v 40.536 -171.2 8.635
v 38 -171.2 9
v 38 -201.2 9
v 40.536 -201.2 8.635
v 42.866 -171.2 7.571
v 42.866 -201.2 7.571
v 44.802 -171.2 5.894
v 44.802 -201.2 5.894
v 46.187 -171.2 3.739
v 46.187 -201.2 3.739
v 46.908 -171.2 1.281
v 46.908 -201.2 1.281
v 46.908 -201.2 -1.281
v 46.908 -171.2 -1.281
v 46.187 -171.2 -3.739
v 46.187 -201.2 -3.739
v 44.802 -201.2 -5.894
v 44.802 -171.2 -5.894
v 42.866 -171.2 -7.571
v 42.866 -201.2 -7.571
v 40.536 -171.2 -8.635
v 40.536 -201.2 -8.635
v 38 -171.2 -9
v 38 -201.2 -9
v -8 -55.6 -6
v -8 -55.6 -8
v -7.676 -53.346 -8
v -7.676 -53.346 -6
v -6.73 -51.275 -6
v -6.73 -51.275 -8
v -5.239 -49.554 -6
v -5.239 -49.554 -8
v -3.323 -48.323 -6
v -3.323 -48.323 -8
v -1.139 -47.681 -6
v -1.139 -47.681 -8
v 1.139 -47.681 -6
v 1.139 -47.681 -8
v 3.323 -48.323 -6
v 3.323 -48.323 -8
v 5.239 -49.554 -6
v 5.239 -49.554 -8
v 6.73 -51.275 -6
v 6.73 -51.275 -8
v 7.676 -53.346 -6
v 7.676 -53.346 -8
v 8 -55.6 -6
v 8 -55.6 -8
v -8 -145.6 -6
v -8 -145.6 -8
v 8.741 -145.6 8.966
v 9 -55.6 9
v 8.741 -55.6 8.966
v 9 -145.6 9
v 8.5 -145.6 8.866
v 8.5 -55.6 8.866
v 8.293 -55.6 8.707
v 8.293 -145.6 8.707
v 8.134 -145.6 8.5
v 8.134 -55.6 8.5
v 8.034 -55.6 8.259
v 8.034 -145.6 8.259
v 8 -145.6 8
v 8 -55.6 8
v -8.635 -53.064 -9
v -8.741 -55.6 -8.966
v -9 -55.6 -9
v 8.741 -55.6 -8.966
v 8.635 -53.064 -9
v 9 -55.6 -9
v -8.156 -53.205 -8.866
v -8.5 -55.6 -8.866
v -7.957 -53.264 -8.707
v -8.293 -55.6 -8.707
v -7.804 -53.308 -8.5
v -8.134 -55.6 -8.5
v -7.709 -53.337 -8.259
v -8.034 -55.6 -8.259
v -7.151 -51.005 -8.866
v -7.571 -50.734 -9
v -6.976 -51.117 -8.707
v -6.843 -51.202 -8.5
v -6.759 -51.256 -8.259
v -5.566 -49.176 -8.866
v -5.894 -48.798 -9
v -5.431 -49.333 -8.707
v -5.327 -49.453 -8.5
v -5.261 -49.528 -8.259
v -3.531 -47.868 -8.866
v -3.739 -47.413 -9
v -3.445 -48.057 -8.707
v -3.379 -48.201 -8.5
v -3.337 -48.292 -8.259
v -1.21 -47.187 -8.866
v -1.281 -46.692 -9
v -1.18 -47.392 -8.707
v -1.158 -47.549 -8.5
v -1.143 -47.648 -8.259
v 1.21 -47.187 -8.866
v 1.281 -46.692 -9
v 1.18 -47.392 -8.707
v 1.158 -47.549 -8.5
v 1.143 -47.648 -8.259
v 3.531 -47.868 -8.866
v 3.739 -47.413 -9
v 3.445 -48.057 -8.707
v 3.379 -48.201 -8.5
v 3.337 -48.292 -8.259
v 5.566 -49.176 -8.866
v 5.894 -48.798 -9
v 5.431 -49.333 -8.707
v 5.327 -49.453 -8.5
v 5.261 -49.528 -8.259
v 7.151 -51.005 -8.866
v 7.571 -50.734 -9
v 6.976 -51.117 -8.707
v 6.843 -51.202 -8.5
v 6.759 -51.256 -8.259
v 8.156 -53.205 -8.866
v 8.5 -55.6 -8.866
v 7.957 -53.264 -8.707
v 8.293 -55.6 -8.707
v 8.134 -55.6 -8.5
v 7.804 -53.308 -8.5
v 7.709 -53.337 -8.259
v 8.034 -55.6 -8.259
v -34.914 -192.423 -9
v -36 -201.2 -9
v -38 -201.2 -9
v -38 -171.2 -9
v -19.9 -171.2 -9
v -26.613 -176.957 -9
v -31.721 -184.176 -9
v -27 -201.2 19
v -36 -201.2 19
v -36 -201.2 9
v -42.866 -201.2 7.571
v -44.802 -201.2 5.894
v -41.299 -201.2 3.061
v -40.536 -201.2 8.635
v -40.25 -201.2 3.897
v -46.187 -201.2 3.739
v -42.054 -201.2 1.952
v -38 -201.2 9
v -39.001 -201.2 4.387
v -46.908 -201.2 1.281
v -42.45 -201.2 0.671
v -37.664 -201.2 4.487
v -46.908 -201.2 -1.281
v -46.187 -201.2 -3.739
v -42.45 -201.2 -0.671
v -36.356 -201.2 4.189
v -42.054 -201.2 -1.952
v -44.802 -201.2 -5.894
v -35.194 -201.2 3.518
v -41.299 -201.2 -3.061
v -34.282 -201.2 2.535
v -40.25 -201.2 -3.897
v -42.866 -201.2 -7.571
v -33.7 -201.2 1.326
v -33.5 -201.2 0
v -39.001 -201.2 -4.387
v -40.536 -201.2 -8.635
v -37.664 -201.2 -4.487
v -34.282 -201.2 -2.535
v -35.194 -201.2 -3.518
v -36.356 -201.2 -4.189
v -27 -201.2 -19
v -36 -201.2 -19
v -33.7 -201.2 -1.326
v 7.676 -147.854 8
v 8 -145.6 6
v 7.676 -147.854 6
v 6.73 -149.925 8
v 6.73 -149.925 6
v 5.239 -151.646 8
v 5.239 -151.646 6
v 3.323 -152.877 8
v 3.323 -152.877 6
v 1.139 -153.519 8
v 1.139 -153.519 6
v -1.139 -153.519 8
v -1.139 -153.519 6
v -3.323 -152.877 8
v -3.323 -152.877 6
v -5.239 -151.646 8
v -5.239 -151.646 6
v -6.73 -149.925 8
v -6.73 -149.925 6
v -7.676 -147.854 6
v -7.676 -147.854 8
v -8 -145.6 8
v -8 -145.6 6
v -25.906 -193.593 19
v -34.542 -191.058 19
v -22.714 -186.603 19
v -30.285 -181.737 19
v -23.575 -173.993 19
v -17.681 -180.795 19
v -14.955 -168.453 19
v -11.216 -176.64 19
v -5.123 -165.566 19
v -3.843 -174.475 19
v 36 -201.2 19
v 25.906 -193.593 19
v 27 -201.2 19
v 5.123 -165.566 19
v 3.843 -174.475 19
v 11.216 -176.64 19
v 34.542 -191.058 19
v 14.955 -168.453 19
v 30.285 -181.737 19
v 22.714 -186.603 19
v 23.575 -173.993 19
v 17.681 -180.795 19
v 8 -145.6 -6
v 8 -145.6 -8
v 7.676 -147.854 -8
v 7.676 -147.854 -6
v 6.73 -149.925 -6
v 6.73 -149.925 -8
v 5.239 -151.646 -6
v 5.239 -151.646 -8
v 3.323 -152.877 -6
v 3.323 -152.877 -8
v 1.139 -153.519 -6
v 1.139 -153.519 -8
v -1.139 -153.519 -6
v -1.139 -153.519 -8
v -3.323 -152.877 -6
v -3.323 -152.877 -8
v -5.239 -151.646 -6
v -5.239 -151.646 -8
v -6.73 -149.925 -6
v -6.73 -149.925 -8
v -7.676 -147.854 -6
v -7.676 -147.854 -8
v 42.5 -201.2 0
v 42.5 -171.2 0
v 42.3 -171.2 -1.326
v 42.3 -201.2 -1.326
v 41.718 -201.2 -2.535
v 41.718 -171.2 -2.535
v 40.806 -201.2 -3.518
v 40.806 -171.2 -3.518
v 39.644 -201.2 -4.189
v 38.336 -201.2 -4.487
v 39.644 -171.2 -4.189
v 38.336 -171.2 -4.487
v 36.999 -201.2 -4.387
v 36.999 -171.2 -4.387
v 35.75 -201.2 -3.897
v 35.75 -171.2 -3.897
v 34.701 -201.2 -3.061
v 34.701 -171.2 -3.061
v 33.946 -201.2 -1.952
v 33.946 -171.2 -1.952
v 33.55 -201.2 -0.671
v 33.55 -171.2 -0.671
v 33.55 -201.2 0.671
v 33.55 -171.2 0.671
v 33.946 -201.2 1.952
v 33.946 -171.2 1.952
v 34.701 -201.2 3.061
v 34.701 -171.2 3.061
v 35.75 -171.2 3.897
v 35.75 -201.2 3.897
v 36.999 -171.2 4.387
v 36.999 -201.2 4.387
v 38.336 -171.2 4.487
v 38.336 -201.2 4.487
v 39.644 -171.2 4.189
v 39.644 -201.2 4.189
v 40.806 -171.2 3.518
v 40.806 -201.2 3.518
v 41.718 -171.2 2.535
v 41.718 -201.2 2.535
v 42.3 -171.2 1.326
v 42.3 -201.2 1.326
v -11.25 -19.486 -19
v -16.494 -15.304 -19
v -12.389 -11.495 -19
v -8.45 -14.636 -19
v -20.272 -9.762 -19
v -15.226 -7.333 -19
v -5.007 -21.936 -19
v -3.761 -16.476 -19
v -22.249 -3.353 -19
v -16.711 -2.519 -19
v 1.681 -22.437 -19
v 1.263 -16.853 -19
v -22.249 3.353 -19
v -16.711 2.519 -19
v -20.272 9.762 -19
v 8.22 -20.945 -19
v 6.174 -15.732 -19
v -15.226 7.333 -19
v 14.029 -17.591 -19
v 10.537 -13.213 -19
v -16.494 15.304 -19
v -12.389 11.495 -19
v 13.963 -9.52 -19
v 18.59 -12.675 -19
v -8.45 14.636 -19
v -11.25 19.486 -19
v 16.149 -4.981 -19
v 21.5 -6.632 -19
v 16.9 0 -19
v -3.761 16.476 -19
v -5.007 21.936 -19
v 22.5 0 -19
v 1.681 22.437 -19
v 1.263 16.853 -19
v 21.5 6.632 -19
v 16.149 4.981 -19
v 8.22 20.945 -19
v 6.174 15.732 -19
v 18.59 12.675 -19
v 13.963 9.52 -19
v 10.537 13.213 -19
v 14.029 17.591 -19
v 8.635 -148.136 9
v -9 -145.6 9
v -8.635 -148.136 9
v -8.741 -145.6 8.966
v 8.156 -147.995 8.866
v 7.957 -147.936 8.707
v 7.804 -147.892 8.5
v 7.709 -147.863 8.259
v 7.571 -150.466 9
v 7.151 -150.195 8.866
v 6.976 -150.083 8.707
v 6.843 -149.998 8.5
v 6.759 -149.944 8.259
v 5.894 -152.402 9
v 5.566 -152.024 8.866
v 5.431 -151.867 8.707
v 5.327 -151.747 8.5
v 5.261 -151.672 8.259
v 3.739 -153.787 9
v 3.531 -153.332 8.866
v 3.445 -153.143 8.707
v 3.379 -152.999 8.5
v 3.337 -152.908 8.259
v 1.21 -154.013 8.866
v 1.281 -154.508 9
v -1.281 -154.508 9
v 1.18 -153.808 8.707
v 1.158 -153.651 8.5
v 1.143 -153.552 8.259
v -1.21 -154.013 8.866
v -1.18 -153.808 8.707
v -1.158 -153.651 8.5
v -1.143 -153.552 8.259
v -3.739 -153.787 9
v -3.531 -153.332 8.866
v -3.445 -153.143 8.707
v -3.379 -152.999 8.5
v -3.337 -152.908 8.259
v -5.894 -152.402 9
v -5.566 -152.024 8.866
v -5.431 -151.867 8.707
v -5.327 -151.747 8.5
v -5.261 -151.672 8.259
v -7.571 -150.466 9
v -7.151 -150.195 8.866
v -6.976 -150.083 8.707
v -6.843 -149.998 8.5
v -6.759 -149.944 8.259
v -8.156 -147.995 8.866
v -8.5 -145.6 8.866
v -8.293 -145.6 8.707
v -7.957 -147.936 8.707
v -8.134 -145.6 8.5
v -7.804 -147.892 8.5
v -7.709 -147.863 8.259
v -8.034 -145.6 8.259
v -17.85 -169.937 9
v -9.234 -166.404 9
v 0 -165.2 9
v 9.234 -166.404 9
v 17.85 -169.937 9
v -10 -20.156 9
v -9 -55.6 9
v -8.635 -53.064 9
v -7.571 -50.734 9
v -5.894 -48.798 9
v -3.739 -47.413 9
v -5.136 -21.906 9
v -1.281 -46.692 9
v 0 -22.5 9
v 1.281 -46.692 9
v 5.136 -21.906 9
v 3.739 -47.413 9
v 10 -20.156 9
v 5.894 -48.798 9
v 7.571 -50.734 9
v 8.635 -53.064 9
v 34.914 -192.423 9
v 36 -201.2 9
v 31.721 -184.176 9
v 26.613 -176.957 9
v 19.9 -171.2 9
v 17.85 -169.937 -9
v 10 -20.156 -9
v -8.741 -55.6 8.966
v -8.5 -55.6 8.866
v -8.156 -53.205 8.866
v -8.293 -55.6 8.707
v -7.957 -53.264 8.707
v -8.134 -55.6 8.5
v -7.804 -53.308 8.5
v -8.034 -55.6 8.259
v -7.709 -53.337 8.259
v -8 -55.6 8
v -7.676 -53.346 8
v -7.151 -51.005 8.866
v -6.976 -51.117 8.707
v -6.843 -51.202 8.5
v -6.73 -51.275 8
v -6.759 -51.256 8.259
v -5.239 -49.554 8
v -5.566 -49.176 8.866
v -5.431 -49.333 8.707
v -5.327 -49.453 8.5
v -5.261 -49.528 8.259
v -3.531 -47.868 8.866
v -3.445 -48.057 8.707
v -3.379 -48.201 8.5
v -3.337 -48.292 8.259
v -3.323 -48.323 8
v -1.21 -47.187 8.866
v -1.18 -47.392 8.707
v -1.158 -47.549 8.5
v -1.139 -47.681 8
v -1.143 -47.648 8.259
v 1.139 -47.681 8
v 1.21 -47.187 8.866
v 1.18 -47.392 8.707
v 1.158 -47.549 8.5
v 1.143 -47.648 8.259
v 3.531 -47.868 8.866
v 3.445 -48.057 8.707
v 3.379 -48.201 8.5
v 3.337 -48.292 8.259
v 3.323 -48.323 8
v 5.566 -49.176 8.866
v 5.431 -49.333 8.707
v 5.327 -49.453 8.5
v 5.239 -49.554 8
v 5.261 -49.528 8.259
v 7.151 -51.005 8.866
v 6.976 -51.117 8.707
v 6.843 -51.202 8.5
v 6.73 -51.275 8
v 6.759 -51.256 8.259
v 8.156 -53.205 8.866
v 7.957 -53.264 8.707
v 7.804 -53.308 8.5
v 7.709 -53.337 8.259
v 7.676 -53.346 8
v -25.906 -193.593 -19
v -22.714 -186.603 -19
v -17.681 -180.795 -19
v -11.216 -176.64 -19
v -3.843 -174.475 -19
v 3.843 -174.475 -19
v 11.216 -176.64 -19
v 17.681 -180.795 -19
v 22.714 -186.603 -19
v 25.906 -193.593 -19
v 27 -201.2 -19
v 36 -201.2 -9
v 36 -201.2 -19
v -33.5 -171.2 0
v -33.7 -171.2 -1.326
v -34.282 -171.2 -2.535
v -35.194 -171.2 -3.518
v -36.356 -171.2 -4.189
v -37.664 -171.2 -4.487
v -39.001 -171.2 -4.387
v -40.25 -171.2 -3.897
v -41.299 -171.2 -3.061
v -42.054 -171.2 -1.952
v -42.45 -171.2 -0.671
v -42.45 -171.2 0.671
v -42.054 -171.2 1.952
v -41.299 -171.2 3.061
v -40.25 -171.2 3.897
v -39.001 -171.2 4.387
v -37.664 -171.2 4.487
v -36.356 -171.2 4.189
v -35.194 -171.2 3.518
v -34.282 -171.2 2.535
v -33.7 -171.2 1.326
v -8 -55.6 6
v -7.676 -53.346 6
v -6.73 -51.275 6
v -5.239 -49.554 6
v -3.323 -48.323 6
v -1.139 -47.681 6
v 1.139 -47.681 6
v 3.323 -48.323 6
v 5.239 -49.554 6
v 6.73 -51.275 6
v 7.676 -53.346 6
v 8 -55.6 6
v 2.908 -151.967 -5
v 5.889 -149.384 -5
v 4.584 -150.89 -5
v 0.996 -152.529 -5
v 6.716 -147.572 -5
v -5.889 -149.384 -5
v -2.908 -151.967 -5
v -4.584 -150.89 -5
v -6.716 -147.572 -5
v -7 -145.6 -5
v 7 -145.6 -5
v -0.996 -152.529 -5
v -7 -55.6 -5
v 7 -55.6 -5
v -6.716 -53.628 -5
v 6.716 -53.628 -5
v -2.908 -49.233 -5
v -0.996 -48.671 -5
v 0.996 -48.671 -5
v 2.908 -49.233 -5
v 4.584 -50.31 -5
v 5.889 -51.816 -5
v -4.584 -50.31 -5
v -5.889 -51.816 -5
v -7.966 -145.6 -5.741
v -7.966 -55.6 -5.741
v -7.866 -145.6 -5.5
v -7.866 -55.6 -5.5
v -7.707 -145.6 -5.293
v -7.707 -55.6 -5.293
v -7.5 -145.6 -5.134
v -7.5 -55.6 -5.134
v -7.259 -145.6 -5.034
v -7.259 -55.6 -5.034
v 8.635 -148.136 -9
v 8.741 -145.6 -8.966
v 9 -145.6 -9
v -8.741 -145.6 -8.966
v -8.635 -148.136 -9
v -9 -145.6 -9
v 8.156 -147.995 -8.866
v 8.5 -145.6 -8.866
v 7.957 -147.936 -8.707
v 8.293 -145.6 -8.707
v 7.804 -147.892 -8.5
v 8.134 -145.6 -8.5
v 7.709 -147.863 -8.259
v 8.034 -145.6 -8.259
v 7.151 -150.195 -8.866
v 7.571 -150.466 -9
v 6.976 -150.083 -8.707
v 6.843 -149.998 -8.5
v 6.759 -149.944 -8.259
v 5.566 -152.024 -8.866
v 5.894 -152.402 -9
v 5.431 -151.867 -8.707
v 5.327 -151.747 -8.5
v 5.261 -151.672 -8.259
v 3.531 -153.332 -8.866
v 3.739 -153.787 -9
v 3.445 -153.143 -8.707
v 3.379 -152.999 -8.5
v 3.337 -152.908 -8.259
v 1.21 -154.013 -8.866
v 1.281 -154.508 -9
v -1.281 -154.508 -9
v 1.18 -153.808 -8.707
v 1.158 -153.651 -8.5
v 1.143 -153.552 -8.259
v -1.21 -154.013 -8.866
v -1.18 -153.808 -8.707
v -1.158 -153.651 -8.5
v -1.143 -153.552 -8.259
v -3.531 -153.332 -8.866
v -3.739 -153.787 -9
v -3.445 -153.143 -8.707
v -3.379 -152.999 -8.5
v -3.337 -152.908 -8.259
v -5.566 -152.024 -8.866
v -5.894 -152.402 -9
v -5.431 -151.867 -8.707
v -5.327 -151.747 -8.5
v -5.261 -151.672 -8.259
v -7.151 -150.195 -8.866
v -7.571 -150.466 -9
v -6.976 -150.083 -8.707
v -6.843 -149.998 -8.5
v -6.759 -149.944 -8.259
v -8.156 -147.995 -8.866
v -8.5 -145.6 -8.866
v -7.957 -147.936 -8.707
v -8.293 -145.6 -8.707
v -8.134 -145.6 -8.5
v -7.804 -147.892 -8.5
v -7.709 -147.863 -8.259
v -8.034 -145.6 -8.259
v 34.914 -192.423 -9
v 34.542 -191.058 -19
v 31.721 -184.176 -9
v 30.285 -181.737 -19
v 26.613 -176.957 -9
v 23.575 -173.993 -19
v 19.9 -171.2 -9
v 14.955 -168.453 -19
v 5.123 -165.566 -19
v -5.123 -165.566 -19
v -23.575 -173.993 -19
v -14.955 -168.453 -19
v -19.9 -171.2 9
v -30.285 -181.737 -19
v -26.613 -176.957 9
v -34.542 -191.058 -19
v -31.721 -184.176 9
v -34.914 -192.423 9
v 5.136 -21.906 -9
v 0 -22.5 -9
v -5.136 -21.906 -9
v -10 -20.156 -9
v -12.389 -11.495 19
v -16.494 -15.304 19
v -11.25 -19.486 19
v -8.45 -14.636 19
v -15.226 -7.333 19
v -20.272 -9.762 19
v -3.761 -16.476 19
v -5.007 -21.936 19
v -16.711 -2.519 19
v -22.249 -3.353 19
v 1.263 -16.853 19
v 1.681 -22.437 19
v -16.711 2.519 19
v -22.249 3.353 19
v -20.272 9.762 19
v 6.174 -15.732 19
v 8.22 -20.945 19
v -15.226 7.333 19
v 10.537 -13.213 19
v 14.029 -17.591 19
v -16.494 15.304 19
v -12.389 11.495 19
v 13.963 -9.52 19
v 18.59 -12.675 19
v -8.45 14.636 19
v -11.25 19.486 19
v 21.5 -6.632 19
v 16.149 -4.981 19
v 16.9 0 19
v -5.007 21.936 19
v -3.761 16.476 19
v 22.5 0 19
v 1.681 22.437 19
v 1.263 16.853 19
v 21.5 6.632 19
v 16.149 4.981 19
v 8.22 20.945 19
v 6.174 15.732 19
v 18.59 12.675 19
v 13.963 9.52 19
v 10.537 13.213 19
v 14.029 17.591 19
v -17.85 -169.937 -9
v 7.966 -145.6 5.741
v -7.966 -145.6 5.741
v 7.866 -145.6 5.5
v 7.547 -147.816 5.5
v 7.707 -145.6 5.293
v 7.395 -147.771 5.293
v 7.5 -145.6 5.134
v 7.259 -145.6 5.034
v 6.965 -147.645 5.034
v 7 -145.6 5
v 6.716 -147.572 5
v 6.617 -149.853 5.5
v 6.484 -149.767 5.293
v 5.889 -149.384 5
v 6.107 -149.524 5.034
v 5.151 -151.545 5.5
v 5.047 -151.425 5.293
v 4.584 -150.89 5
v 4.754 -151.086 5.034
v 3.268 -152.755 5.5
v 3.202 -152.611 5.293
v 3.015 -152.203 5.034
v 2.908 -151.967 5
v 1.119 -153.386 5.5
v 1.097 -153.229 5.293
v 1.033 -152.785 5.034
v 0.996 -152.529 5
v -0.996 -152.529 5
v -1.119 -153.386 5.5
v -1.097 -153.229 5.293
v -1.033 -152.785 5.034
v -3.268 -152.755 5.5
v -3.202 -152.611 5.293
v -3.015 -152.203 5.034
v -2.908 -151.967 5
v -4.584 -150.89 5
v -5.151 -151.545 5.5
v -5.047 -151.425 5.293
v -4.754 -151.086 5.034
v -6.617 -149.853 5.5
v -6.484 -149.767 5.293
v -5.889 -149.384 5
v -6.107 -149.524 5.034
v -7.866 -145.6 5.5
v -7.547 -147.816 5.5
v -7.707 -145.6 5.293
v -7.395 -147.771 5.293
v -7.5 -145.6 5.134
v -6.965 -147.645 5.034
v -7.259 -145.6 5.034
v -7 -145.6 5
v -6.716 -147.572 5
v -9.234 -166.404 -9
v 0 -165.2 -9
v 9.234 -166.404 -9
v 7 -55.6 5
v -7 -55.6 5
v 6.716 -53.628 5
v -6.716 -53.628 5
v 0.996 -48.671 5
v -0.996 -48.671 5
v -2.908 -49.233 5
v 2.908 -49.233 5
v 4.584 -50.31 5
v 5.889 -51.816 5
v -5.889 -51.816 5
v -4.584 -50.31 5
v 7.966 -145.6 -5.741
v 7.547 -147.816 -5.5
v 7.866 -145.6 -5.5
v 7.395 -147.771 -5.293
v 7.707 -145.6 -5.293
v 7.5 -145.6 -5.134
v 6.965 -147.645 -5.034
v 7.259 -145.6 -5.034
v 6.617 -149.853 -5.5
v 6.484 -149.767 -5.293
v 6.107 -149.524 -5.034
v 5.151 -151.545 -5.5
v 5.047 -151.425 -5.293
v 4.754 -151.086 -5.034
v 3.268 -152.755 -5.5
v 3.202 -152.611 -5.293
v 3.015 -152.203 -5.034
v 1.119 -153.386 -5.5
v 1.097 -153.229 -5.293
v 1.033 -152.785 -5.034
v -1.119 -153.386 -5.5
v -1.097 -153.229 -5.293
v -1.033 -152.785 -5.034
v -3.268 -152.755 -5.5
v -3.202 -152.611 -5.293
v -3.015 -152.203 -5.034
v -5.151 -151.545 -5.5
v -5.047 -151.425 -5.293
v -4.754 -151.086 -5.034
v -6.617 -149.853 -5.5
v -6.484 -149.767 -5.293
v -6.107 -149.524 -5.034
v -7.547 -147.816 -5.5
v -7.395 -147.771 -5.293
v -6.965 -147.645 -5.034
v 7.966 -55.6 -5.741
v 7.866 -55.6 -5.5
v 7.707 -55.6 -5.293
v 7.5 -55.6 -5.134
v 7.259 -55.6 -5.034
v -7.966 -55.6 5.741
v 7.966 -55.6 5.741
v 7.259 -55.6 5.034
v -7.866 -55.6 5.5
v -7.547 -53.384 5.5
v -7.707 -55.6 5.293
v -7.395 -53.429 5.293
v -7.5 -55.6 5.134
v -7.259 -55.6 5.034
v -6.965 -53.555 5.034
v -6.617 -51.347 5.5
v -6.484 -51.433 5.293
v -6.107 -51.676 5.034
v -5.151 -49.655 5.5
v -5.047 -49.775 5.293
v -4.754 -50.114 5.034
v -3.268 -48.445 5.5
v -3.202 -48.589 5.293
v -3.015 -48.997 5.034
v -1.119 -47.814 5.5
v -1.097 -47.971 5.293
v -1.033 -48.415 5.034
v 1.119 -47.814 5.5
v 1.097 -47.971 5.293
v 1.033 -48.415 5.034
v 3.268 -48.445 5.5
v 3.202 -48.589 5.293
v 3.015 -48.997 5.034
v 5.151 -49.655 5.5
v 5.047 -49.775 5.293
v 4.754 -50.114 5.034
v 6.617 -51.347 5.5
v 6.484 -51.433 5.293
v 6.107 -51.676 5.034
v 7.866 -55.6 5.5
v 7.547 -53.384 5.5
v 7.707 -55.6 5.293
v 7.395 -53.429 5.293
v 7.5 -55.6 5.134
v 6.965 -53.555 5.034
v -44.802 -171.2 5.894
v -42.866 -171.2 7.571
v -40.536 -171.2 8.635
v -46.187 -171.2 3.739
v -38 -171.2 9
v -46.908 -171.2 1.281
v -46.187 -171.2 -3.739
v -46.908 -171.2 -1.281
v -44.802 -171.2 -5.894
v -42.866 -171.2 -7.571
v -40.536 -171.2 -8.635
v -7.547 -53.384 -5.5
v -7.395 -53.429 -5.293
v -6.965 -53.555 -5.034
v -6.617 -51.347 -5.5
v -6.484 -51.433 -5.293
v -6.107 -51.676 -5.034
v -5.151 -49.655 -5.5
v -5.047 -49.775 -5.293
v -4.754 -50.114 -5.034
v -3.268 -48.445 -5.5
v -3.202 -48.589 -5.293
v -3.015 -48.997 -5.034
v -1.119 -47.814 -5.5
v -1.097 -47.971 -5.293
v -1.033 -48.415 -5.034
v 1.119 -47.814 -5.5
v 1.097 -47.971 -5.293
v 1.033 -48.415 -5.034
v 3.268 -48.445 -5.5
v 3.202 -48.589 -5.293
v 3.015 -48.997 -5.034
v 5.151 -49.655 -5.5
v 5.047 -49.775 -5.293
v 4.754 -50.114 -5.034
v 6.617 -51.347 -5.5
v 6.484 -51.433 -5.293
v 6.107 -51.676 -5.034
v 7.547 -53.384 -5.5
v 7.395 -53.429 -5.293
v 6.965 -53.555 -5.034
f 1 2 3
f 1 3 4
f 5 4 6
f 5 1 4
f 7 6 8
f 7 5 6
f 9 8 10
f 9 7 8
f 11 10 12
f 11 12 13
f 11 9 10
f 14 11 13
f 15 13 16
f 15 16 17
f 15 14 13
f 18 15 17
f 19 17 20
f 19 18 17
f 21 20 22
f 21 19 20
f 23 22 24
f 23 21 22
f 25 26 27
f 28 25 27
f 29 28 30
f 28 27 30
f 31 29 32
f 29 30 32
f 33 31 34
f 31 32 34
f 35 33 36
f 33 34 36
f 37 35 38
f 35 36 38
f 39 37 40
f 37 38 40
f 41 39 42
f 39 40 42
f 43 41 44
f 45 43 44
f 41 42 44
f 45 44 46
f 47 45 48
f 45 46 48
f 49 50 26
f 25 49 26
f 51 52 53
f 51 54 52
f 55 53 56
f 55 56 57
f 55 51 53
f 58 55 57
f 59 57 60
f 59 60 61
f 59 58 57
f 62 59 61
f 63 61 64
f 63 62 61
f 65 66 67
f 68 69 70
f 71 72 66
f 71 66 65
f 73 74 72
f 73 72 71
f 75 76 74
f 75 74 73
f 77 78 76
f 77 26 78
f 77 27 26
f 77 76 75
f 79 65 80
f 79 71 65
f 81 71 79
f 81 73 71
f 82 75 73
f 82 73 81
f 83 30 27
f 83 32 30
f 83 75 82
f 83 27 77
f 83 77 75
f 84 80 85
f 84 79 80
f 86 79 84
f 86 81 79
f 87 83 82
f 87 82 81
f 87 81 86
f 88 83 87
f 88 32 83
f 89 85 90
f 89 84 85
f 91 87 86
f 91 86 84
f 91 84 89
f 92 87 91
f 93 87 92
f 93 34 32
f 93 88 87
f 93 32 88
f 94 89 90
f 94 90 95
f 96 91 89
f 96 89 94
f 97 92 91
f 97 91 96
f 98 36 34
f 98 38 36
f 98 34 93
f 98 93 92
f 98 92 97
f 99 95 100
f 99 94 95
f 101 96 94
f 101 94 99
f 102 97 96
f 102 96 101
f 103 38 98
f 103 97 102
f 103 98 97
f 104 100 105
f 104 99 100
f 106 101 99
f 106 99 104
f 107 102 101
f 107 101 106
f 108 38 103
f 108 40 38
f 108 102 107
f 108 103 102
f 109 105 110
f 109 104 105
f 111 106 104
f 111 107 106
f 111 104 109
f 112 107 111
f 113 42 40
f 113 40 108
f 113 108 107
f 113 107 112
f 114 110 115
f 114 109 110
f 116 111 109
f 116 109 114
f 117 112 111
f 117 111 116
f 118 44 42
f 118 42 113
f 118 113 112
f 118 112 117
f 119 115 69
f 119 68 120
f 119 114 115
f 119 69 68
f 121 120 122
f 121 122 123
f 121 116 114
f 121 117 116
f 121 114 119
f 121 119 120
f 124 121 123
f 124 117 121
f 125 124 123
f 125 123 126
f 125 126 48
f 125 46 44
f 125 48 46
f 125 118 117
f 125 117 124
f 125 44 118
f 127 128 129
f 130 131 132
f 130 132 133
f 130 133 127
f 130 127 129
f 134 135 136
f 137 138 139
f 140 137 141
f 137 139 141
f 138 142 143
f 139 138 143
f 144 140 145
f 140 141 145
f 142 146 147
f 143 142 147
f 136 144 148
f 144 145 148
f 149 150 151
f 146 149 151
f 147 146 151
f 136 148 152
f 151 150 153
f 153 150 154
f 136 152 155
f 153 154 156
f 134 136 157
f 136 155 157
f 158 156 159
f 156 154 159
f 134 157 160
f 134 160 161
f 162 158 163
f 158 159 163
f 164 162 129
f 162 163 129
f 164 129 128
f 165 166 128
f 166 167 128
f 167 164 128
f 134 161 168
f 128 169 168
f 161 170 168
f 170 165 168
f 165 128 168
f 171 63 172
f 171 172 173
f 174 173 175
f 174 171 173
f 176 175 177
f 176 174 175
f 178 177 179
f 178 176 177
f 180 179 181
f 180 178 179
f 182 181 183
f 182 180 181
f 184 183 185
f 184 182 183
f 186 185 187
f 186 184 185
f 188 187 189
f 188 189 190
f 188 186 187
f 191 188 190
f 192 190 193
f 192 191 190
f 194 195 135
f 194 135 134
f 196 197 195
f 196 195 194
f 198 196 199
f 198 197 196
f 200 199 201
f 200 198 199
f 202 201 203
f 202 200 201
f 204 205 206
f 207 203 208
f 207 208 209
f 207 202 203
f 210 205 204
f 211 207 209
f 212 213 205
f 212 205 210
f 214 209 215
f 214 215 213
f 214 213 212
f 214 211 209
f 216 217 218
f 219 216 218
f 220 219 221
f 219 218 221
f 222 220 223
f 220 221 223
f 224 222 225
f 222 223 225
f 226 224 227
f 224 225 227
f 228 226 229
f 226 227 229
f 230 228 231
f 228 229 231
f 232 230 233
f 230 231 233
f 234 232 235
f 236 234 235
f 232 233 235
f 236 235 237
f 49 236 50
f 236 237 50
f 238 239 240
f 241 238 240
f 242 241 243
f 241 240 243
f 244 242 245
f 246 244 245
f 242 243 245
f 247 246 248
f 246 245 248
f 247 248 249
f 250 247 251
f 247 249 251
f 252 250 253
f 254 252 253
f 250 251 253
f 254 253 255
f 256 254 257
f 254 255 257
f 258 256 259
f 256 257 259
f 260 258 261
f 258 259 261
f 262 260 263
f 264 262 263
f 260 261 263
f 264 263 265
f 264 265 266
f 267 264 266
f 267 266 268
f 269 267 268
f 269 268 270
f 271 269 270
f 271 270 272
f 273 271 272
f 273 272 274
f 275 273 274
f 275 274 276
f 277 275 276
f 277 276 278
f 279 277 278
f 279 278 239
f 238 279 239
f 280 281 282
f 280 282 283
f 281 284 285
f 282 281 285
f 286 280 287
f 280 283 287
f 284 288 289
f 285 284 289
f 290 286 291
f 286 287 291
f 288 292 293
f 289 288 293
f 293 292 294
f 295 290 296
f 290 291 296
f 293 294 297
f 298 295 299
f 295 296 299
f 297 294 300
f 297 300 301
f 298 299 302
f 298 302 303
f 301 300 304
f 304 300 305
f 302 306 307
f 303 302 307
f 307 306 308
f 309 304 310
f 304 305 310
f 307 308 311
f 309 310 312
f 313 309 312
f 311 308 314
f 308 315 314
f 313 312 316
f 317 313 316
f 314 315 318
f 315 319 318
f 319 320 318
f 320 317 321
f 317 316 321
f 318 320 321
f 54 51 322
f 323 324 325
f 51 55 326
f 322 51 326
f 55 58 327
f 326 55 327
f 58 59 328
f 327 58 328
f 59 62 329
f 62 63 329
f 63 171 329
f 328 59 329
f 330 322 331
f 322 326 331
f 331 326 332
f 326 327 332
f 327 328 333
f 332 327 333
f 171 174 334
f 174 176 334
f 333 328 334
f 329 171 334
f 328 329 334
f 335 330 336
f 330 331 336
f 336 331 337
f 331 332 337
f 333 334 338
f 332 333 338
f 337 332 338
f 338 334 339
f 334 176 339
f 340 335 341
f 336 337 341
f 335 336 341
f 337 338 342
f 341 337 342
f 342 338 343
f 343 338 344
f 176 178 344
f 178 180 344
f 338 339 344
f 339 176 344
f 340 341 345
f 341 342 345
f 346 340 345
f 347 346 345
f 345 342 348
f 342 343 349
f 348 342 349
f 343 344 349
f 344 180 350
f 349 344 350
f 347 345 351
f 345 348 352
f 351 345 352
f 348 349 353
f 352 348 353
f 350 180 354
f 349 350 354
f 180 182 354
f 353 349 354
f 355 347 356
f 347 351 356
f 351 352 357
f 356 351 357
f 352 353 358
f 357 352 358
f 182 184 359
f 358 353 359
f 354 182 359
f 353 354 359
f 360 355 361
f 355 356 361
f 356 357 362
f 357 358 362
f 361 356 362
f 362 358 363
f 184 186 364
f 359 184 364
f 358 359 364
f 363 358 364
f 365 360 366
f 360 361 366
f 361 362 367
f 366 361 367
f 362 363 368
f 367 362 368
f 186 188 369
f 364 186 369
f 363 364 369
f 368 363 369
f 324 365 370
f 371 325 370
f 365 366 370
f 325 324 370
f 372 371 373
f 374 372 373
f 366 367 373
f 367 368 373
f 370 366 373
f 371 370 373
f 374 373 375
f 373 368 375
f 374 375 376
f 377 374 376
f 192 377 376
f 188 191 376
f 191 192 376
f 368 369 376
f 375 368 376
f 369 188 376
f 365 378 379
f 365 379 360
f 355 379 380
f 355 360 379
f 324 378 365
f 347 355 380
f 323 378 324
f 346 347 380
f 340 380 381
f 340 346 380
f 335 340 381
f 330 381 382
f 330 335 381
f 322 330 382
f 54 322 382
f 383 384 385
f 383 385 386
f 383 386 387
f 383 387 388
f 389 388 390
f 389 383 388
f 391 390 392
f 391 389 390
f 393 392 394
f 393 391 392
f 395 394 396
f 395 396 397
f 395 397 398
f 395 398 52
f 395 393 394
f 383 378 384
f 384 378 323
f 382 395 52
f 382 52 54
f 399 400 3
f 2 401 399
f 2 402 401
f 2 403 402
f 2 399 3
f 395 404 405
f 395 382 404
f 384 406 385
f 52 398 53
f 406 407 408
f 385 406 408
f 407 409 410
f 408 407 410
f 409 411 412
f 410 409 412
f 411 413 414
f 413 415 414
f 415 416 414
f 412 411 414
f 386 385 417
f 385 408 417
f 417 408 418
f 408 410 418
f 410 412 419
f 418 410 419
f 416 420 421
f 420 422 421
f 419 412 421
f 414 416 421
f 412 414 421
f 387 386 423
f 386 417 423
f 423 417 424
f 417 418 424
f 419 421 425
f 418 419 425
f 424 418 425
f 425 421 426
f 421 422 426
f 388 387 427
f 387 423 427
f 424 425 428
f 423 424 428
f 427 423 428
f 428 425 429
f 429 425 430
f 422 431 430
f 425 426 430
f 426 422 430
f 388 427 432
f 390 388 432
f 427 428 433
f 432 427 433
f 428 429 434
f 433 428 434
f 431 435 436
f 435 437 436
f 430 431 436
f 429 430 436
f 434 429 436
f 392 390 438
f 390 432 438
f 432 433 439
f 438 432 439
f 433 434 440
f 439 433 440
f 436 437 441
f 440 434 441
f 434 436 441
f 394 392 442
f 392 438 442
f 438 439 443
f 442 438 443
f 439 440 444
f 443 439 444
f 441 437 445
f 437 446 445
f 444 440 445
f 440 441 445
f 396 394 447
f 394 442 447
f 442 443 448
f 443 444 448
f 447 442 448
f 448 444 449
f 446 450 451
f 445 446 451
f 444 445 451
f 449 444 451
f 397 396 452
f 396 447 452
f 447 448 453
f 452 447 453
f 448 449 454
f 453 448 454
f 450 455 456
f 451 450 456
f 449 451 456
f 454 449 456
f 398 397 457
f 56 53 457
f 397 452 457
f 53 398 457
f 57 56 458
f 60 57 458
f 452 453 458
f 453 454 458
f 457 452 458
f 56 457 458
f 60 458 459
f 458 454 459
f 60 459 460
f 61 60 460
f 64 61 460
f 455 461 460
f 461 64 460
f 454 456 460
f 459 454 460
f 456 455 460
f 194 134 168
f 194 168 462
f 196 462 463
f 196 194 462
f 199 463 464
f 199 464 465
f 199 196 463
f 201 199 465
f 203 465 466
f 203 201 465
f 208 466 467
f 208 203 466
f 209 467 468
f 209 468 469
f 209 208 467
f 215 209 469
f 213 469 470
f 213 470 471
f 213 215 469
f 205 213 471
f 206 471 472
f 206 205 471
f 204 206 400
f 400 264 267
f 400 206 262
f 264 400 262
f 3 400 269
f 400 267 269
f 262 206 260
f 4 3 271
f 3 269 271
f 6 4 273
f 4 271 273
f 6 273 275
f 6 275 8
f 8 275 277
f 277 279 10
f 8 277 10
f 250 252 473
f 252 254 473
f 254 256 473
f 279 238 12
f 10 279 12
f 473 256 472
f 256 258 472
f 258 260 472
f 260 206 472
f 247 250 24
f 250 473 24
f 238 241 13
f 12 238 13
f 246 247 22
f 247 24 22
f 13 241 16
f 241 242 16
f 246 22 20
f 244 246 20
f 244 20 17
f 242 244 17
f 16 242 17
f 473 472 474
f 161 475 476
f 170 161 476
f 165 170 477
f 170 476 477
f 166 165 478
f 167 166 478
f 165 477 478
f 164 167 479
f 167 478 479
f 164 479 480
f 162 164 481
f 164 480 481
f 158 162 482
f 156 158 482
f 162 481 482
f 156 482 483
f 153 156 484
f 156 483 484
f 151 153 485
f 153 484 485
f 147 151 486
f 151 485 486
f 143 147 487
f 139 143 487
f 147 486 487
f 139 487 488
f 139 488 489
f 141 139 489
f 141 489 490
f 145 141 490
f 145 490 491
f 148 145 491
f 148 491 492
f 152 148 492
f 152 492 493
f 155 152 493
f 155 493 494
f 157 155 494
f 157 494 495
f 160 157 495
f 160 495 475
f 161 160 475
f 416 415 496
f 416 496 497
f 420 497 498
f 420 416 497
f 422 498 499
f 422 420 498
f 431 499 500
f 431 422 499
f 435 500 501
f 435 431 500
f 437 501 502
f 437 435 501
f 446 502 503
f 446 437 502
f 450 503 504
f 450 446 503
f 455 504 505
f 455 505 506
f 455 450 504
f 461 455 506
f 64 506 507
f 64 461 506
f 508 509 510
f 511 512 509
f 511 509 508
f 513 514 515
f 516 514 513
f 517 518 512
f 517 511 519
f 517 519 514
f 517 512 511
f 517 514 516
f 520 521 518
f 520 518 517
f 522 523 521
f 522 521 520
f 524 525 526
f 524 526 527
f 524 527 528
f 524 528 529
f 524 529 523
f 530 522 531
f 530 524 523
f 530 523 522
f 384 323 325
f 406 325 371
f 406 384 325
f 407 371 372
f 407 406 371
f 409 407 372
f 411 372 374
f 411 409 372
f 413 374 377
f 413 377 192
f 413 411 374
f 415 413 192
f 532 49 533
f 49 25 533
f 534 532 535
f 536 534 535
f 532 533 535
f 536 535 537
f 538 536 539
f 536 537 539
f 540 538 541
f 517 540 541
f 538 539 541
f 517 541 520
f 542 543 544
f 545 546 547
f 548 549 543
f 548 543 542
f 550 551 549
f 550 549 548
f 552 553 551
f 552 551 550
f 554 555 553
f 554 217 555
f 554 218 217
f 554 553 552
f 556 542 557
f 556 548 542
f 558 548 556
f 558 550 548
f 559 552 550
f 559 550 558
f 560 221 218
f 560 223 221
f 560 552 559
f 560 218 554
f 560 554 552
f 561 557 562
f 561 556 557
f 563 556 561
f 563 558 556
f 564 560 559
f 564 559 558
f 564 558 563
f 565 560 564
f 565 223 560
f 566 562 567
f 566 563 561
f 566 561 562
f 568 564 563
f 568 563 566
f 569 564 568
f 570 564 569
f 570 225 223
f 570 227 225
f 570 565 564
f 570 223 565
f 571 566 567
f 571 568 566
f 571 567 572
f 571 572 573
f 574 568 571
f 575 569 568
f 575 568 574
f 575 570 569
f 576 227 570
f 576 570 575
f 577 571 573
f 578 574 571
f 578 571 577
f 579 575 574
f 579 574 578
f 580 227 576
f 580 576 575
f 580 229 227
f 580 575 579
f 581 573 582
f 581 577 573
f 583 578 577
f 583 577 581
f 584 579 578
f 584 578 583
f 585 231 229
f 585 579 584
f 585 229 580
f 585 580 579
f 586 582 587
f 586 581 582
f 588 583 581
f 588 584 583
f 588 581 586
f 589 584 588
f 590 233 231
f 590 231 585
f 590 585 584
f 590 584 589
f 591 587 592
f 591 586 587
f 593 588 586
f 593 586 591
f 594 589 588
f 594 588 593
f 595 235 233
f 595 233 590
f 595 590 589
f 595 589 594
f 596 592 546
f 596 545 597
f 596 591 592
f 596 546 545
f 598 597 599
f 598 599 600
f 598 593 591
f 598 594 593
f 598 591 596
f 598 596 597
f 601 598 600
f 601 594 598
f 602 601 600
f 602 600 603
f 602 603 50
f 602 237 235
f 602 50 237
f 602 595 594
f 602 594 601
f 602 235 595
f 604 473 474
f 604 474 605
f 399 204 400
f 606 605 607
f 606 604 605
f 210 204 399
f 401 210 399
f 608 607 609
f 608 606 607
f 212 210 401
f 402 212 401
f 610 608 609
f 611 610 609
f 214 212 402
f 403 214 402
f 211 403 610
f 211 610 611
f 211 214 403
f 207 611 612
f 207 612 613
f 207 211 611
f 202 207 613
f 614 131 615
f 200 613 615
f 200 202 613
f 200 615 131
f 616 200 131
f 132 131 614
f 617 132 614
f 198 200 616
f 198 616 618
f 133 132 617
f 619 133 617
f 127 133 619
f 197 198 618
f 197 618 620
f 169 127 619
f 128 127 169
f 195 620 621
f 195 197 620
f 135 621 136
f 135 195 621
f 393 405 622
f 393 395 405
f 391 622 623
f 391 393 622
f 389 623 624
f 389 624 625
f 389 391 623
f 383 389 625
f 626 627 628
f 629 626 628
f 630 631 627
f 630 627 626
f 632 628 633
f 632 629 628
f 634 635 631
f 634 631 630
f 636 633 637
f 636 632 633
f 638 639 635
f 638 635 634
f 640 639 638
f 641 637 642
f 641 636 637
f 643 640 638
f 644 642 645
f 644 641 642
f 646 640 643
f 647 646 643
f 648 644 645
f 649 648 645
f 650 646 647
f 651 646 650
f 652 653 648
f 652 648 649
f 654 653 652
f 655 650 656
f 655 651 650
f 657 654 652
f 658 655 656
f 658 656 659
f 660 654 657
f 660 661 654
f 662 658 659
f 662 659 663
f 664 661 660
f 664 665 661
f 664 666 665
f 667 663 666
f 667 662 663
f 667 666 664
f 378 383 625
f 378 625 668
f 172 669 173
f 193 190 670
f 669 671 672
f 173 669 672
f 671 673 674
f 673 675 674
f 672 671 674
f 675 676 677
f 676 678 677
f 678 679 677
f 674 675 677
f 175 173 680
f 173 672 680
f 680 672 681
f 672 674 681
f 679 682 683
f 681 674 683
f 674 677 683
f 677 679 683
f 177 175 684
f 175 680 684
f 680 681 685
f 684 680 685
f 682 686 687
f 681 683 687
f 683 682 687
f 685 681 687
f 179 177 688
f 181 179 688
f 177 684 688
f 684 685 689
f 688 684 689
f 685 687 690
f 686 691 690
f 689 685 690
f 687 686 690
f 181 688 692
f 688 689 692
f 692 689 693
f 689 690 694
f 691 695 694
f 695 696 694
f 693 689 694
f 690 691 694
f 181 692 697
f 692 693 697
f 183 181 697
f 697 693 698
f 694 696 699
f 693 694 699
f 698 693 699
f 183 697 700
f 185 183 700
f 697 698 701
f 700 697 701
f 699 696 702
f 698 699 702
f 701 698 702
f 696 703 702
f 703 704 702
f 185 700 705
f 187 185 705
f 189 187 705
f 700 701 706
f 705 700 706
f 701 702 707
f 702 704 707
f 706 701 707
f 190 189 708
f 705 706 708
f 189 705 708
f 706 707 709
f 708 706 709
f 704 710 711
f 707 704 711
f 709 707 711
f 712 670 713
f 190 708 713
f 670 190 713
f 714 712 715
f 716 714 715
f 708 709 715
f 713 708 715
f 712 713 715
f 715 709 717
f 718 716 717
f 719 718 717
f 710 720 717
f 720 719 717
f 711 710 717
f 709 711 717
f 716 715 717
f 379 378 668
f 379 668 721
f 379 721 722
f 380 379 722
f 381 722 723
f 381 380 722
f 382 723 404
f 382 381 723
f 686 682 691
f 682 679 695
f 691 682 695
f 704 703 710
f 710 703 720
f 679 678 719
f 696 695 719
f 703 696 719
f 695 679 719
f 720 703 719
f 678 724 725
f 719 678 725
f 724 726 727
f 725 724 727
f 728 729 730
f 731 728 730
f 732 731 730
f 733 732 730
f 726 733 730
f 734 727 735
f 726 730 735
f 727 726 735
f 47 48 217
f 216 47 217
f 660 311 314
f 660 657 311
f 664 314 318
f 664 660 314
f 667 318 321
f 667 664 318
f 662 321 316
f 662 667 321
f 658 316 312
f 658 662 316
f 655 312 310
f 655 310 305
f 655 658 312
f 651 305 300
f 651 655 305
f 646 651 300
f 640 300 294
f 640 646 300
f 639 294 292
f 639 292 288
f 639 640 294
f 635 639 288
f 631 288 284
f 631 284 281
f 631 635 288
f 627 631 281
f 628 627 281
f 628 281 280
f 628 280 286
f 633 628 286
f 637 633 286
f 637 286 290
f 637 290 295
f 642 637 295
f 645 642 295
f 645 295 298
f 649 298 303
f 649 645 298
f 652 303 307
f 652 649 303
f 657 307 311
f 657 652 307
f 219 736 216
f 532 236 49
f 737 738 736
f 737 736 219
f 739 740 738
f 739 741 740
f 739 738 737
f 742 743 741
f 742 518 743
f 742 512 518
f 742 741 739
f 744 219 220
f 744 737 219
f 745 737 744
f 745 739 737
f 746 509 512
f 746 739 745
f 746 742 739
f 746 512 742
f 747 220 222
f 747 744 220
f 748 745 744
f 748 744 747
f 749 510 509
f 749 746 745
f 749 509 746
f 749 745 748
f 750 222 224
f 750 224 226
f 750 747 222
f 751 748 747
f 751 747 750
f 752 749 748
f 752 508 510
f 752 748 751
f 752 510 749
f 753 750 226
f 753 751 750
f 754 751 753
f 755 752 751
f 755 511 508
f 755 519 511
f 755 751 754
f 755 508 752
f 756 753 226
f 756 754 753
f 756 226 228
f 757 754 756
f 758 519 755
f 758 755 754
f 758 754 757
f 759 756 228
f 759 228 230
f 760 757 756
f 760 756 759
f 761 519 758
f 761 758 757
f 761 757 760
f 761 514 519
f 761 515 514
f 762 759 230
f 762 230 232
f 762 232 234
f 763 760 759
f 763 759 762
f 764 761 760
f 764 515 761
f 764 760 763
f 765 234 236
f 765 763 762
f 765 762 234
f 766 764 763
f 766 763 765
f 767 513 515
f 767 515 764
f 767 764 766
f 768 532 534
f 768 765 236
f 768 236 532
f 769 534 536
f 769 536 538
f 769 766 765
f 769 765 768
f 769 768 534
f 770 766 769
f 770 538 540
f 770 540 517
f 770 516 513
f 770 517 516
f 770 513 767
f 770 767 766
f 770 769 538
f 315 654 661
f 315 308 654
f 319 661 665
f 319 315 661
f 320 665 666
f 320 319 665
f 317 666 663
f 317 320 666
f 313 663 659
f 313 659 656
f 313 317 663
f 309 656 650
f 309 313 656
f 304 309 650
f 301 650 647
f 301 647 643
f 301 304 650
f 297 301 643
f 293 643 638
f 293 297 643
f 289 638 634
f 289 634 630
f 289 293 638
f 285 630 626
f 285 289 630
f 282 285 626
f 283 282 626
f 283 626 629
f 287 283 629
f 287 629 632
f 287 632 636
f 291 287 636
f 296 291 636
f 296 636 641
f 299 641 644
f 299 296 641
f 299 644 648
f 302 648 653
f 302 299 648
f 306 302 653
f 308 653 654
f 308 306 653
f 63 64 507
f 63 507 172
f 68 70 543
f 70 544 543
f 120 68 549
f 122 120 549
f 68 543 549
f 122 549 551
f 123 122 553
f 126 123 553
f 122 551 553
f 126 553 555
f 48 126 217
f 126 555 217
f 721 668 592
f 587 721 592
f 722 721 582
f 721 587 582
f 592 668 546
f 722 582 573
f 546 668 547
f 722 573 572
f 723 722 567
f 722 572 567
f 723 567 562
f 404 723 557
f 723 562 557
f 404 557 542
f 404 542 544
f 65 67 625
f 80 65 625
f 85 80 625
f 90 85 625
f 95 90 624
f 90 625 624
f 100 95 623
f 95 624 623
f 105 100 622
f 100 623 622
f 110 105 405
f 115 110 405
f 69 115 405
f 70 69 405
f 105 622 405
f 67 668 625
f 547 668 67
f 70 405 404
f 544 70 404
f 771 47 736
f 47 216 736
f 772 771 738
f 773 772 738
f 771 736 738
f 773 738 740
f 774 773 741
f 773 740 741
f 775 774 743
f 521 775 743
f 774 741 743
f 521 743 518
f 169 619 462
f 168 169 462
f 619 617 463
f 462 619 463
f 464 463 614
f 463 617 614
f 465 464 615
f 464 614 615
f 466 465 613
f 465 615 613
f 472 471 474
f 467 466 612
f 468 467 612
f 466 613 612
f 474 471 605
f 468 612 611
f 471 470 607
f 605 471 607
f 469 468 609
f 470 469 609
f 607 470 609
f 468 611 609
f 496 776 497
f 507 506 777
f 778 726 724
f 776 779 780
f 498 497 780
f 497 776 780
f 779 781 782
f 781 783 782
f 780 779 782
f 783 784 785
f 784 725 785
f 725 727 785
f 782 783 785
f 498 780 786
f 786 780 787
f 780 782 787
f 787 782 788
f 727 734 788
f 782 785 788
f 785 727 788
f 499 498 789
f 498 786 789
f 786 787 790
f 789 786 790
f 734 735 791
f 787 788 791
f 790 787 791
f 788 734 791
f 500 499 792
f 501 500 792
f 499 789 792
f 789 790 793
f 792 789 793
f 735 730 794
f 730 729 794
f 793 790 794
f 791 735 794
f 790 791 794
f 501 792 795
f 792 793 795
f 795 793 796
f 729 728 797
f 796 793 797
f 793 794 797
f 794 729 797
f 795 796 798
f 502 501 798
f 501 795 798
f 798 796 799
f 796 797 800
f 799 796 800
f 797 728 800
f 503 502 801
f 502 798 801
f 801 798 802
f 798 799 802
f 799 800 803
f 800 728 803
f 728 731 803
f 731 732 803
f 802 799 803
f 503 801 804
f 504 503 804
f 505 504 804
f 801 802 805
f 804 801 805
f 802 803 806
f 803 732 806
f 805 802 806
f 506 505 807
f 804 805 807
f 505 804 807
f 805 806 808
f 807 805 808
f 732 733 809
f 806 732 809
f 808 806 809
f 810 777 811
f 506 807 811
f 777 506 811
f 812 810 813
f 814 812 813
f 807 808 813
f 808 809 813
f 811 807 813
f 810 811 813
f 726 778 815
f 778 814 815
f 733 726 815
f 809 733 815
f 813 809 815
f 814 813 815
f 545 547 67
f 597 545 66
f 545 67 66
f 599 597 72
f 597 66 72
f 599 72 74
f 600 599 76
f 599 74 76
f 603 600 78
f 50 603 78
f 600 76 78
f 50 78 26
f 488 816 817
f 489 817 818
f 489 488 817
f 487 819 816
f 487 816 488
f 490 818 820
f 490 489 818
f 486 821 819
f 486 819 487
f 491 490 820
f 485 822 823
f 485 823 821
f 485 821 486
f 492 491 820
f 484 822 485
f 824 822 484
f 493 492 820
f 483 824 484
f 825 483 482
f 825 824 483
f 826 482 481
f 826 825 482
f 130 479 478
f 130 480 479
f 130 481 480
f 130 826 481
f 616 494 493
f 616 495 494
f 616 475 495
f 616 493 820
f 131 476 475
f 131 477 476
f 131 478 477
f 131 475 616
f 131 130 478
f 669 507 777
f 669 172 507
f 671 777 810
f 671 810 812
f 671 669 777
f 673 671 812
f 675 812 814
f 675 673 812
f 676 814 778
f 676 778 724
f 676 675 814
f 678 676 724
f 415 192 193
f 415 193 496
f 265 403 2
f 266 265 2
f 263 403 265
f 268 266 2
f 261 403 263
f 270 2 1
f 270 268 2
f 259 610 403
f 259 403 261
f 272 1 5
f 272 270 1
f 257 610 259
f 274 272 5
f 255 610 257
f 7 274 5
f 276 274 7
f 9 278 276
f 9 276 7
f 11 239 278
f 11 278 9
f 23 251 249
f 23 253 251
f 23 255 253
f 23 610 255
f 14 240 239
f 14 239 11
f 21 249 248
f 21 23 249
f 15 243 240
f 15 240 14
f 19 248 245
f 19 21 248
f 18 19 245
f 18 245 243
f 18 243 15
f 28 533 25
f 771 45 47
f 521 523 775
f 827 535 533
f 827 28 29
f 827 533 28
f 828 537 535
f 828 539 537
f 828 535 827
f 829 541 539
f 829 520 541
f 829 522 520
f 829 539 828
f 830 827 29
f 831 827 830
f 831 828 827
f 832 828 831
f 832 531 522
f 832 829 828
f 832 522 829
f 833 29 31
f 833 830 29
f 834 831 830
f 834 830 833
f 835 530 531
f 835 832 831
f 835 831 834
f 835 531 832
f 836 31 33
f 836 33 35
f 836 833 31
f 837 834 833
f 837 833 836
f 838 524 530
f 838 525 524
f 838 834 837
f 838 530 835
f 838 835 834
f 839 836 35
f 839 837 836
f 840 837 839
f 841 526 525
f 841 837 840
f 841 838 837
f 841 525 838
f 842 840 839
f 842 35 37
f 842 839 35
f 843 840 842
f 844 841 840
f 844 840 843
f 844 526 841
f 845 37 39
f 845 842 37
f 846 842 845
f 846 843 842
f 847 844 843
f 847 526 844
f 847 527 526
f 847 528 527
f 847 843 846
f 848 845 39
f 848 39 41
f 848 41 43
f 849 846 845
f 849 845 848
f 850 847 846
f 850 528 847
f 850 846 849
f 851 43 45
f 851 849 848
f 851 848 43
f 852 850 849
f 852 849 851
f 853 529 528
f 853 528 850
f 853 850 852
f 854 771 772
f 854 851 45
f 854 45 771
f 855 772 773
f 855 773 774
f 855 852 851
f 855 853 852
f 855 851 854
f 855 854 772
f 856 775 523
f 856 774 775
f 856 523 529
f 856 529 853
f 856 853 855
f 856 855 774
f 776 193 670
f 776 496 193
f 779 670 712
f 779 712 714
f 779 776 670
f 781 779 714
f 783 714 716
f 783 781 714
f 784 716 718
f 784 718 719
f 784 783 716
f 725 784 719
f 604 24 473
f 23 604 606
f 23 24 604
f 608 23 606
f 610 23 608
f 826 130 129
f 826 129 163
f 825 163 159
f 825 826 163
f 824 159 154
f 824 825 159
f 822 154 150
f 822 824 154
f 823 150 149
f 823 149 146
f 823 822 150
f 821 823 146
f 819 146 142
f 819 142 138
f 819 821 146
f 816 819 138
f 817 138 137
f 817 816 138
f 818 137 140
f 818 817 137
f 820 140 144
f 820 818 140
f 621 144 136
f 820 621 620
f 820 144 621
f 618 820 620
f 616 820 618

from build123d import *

# Parameters (mm, degrees)
SKETCH1_R             = 22.5
SKETCH1_R_2           = 16.9
BOSS_EXTRUDE1_DEPTH   = 19
BOSS_EXTRUDE1_2_DEPTH = 19
BOSS_EXTRUDE2_DEPTH   = 9
CUT_EXTRUDE1_DEPTH    = 4
FILLET1_R             = 1
BOSS_EXTRUDE3_DEPTH   = 30
CUT_EXTRUDE2_DEPTH    = 29
SKETCH5_R             = 4.5
CUT_EXTRUDE3_DEPTH    = 31


with BuildPart() as part:
    # Sketch1 → Boss-Extrude1 (new body, symmetric)
    with BuildSketch(Plane.XY):
        Circle(SKETCH1_R)
        Circle(SKETCH1_R_2, mode=Mode.SUBTRACT)
    extrude(amount=BOSS_EXTRUDE1_DEPTH, both=True)


with BuildPart() as body_2:
    # Sketch1 → Boss-Extrude1 2 (new body, symmetric)
    with BuildSketch(Plane.XY):
        with BuildLine():
            ThreePointArc((36, -201.2), (0, -165.2), (-36, -201.2))
            Line((-36, -201.2), (-27, -201.2))
            ThreePointArc((-27, -201.2), (0, -174.2), (27, -201.2))
            Line((27, -201.2), (36, -201.2))
        make_face()
    extrude(amount=BOSS_EXTRUDE1_2_DEPTH, both=True)

    # Sketch3 → Boss-Extrude3 (add)
    with BuildSketch(Plane(origin=(0, -171.2, 0), x_dir=(-1, 0, 0), z_dir=(0, -1, 0))):
        with BuildLine():
            Line((38, -9), (-38, -9))
            ThreePointArc((-38, -9), (-47, 0), (-38, 9))
            Line((-38, 9), (38, 9))
            ThreePointArc((38, 9), (47, 0), (38, -9))
        make_face()
    extrude(amount=BOSS_EXTRUDE3_DEPTH)

    # Sketch4 → Cut-Extrude2 (cut, through all)
    with BuildSketch(Plane.XY.offset(9)):
        with BuildLine():
            Line((-27, -201.2), (27, -201.2))
            ThreePointArc((27, -201.2), (0, -174.2), (-27, -201.2))
        make_face()
    extrude(amount=-CUT_EXTRUDE2_DEPTH, mode=Mode.SUBTRACT)

    # Sketch5 → Cut-Extrude3 (cut, through all)
    with BuildSketch(Plane(origin=(0, -171.2, 0), x_dir=(1, 0, 0), z_dir=(0, 1, 0))):
        with Locations((38, 0)):
            Circle(SKETCH5_R)
        with Locations((-38, 0)):
            Circle(SKETCH5_R)
    extrude(amount=-CUT_EXTRUDE3_DEPTH, mode=Mode.SUBTRACT)


with BuildPart() as body_3:
    # Sketch1<5> → Boss-Extrude2 (new body, symmetric)
    with BuildSketch(Plane.XY):
        with BuildLine():
            ThreePointArc((10, -20.155644371), (0, -22.5), (-10, -20.155644371))
            Line((-10, -20.155644371), (-17.849697213, -169.936789841))
            ThreePointArc((-17.849697213, -169.936789841), (0, -165.2), (17.849697213, -169.936789841))
            Line((17.849697213, -169.936789841), (10, -20.155644371))
        make_face()
    extrude(amount=BOSS_EXTRUDE2_DEPTH, both=True)

    # Sketch2 → Cut-Extrude1 (cut)
    with BuildSketch(Plane.XY.offset(9)):
        with BuildLine():
            Line((-8, -145.6), (-8, -55.6))
            ThreePointArc((-8, -55.6), (0, -47.6), (8, -55.6))
            Line((8, -55.6), (8, -145.6))
            ThreePointArc((8, -145.6), (0, -153.6), (-8, -145.6))
        make_face()
    cut_extrude1 = extrude(amount=-CUT_EXTRUDE1_DEPTH, mode=Mode.SUBTRACT)

    # Mirror1: Cut-Extrude1 across plane
    add(cut_extrude1.mirror(Plane.XY), mode=Mode.SUBTRACT)

    # Fillet1
    fillet1_edges = [body_3.edges().sort_by_distance(p)[0] for p in [
        (0, -153.6, 5),
        (-8, -100.6, 5),
        (0, -47.6, 5),
        (8, -100.6, 5),
        (0, -153.6, 9),
        (8, -100.6, 9),
        (0, -47.6, 9),
        (-8, -100.6, 9),
        (0, -153.6, -9),
        (8, -100.6, -9),
        (0, -47.6, -9),
        (-8, -100.6, -9),
        (0, -153.6, -5),
        (8, -100.6, -5),
        (0, -47.6, -5),
        (-8, -100.6, -5),
    ]]
    fillet(fillet1_edges, radius=FILLET1_R)


solid = Compound([part.part, body_2.part, body_3.part])
